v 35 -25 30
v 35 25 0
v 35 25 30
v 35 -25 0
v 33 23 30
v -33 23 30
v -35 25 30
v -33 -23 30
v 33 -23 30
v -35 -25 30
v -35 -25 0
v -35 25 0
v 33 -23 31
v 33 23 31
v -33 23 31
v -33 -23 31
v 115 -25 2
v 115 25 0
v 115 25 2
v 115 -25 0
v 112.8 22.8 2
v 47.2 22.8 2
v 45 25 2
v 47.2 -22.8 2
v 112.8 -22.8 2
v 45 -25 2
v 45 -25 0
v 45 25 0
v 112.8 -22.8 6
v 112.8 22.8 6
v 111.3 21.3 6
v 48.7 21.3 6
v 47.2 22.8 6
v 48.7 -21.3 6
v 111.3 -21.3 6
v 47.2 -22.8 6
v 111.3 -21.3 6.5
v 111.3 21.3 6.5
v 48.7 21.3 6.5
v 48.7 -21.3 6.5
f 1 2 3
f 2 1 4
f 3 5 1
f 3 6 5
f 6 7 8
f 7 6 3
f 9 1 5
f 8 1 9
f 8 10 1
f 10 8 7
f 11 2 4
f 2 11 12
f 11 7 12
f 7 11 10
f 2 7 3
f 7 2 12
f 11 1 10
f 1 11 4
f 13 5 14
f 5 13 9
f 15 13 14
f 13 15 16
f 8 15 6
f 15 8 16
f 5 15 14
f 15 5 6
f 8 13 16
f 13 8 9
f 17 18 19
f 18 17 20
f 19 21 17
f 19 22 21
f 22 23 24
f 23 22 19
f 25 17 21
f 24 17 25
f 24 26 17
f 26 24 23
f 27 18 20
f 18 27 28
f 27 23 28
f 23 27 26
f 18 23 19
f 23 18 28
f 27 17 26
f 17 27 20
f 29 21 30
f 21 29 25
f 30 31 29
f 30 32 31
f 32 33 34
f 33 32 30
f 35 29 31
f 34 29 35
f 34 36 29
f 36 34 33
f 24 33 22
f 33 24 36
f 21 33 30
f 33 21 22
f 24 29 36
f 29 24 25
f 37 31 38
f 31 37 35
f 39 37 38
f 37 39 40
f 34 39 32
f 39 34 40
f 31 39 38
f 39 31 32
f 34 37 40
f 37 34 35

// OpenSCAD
// Two-part enclosure for a small electronics board (e.g. Arduino temperature logger)
// Both parts are modelled in their print orientation, side by side on the bed.

$fn = 64;

// ---------- Part 1: Box (open top) ----------
box_outer_x = 70;   // outer width  (X)
box_outer_y = 50;   // outer depth  (Y)
box_outer_z = 30;   // outer height (Z)
box_wall    = 2;    // side wall thickness
box_floor   = 2;    // floor thickness

// ---------- Part 2: Lid (printed upside down) ----------
lid_plate_x   = 70;    // plate width  (X)
lid_plate_y   = 50;    // plate depth  (Y)
lid_plate_z   = 2;     // plate thickness (Z)
lid_wall      = 1.5;   // lip wall thickness
lip_height    = 4;     // lip height above plate
lip_outer_x   = 65.6;  // lip outer width  (X)
lip_outer_y   = 45.6;  // lip outer depth  (Y)

// ---------- Layout ----------
gap = 10;  // gap between the two parts along X

// Box is centred on the origin in X and Y.
// Lid is placed on the +X side of the box, 10 mm away from the box's +X face.
lid_x_offset = box_outer_x / 2 + gap + lid_plate_x / 2;

// ---------- Part 1: Box ----------
module box() {
    // Outer solid (base at z = 0, centred in X and Y)
    translate([0, 0, box_outer_z / 2]) {
        cube([box_outer_x, box_outer_y, box_outer_z], center = true);
    }
    // Cavity: 2 mm walls, 2 mm floor, open top (cut extends 1 mm past the top face)
    // Cavity base at z = box_floor, centred in X and Y
    translate([0, 0, box_floor + (box_outer_z - box_floor + 1) / 2]) {
        cube([box_outer_x - 2 * box_wall,
              box_outer_y - 2 * box_wall,
              box_outer_z - box_floor + 1],
             center = true);
    }
}

// ---------- Part 2: Lid (printed upside down) ----------
module lid() {
    // Plate lying flat on the bed (z = 0 to z = 2), centred in X and Y
    translate([0, 0, lid_plate_z / 2]) {
        cube([lid_plate_x, lid_plate_y, lid_plate_z], center = true);
    }
    // Lip: 1.5 mm thick wall, 4 mm tall, outer 65.6 x 45.6, centred on the plate
    // The lip sits on top of the plate (z = 2 to z = 6)
    // Outer lip solid
    translate([0, 0, lid_plate_z + lip_height / 2]) {
        cube([lip_outer_x, lip_outer_y, lip_height], center = true);
    }
    // Inner lip void (extends 1 mm past the top of the lip to keep the top open)
    translate([0, 0, lid_plate_z + lip_height / 2]) {
        cube([lip_outer_x - 2 * lid_wall,
              lip_outer_y - 2 * lid_wall,
              lip_height + 1],
             center = true);
    }
}

// ---------- Assemble both parts on the bed ----------
union() {
    // Box: centred on origin
    difference() {
        box();
    }

    // Lid: shifted to +X side
    translate([lid_x_offset, 0, 0]) {
        difference() {
            lid();
        }
    }
}
